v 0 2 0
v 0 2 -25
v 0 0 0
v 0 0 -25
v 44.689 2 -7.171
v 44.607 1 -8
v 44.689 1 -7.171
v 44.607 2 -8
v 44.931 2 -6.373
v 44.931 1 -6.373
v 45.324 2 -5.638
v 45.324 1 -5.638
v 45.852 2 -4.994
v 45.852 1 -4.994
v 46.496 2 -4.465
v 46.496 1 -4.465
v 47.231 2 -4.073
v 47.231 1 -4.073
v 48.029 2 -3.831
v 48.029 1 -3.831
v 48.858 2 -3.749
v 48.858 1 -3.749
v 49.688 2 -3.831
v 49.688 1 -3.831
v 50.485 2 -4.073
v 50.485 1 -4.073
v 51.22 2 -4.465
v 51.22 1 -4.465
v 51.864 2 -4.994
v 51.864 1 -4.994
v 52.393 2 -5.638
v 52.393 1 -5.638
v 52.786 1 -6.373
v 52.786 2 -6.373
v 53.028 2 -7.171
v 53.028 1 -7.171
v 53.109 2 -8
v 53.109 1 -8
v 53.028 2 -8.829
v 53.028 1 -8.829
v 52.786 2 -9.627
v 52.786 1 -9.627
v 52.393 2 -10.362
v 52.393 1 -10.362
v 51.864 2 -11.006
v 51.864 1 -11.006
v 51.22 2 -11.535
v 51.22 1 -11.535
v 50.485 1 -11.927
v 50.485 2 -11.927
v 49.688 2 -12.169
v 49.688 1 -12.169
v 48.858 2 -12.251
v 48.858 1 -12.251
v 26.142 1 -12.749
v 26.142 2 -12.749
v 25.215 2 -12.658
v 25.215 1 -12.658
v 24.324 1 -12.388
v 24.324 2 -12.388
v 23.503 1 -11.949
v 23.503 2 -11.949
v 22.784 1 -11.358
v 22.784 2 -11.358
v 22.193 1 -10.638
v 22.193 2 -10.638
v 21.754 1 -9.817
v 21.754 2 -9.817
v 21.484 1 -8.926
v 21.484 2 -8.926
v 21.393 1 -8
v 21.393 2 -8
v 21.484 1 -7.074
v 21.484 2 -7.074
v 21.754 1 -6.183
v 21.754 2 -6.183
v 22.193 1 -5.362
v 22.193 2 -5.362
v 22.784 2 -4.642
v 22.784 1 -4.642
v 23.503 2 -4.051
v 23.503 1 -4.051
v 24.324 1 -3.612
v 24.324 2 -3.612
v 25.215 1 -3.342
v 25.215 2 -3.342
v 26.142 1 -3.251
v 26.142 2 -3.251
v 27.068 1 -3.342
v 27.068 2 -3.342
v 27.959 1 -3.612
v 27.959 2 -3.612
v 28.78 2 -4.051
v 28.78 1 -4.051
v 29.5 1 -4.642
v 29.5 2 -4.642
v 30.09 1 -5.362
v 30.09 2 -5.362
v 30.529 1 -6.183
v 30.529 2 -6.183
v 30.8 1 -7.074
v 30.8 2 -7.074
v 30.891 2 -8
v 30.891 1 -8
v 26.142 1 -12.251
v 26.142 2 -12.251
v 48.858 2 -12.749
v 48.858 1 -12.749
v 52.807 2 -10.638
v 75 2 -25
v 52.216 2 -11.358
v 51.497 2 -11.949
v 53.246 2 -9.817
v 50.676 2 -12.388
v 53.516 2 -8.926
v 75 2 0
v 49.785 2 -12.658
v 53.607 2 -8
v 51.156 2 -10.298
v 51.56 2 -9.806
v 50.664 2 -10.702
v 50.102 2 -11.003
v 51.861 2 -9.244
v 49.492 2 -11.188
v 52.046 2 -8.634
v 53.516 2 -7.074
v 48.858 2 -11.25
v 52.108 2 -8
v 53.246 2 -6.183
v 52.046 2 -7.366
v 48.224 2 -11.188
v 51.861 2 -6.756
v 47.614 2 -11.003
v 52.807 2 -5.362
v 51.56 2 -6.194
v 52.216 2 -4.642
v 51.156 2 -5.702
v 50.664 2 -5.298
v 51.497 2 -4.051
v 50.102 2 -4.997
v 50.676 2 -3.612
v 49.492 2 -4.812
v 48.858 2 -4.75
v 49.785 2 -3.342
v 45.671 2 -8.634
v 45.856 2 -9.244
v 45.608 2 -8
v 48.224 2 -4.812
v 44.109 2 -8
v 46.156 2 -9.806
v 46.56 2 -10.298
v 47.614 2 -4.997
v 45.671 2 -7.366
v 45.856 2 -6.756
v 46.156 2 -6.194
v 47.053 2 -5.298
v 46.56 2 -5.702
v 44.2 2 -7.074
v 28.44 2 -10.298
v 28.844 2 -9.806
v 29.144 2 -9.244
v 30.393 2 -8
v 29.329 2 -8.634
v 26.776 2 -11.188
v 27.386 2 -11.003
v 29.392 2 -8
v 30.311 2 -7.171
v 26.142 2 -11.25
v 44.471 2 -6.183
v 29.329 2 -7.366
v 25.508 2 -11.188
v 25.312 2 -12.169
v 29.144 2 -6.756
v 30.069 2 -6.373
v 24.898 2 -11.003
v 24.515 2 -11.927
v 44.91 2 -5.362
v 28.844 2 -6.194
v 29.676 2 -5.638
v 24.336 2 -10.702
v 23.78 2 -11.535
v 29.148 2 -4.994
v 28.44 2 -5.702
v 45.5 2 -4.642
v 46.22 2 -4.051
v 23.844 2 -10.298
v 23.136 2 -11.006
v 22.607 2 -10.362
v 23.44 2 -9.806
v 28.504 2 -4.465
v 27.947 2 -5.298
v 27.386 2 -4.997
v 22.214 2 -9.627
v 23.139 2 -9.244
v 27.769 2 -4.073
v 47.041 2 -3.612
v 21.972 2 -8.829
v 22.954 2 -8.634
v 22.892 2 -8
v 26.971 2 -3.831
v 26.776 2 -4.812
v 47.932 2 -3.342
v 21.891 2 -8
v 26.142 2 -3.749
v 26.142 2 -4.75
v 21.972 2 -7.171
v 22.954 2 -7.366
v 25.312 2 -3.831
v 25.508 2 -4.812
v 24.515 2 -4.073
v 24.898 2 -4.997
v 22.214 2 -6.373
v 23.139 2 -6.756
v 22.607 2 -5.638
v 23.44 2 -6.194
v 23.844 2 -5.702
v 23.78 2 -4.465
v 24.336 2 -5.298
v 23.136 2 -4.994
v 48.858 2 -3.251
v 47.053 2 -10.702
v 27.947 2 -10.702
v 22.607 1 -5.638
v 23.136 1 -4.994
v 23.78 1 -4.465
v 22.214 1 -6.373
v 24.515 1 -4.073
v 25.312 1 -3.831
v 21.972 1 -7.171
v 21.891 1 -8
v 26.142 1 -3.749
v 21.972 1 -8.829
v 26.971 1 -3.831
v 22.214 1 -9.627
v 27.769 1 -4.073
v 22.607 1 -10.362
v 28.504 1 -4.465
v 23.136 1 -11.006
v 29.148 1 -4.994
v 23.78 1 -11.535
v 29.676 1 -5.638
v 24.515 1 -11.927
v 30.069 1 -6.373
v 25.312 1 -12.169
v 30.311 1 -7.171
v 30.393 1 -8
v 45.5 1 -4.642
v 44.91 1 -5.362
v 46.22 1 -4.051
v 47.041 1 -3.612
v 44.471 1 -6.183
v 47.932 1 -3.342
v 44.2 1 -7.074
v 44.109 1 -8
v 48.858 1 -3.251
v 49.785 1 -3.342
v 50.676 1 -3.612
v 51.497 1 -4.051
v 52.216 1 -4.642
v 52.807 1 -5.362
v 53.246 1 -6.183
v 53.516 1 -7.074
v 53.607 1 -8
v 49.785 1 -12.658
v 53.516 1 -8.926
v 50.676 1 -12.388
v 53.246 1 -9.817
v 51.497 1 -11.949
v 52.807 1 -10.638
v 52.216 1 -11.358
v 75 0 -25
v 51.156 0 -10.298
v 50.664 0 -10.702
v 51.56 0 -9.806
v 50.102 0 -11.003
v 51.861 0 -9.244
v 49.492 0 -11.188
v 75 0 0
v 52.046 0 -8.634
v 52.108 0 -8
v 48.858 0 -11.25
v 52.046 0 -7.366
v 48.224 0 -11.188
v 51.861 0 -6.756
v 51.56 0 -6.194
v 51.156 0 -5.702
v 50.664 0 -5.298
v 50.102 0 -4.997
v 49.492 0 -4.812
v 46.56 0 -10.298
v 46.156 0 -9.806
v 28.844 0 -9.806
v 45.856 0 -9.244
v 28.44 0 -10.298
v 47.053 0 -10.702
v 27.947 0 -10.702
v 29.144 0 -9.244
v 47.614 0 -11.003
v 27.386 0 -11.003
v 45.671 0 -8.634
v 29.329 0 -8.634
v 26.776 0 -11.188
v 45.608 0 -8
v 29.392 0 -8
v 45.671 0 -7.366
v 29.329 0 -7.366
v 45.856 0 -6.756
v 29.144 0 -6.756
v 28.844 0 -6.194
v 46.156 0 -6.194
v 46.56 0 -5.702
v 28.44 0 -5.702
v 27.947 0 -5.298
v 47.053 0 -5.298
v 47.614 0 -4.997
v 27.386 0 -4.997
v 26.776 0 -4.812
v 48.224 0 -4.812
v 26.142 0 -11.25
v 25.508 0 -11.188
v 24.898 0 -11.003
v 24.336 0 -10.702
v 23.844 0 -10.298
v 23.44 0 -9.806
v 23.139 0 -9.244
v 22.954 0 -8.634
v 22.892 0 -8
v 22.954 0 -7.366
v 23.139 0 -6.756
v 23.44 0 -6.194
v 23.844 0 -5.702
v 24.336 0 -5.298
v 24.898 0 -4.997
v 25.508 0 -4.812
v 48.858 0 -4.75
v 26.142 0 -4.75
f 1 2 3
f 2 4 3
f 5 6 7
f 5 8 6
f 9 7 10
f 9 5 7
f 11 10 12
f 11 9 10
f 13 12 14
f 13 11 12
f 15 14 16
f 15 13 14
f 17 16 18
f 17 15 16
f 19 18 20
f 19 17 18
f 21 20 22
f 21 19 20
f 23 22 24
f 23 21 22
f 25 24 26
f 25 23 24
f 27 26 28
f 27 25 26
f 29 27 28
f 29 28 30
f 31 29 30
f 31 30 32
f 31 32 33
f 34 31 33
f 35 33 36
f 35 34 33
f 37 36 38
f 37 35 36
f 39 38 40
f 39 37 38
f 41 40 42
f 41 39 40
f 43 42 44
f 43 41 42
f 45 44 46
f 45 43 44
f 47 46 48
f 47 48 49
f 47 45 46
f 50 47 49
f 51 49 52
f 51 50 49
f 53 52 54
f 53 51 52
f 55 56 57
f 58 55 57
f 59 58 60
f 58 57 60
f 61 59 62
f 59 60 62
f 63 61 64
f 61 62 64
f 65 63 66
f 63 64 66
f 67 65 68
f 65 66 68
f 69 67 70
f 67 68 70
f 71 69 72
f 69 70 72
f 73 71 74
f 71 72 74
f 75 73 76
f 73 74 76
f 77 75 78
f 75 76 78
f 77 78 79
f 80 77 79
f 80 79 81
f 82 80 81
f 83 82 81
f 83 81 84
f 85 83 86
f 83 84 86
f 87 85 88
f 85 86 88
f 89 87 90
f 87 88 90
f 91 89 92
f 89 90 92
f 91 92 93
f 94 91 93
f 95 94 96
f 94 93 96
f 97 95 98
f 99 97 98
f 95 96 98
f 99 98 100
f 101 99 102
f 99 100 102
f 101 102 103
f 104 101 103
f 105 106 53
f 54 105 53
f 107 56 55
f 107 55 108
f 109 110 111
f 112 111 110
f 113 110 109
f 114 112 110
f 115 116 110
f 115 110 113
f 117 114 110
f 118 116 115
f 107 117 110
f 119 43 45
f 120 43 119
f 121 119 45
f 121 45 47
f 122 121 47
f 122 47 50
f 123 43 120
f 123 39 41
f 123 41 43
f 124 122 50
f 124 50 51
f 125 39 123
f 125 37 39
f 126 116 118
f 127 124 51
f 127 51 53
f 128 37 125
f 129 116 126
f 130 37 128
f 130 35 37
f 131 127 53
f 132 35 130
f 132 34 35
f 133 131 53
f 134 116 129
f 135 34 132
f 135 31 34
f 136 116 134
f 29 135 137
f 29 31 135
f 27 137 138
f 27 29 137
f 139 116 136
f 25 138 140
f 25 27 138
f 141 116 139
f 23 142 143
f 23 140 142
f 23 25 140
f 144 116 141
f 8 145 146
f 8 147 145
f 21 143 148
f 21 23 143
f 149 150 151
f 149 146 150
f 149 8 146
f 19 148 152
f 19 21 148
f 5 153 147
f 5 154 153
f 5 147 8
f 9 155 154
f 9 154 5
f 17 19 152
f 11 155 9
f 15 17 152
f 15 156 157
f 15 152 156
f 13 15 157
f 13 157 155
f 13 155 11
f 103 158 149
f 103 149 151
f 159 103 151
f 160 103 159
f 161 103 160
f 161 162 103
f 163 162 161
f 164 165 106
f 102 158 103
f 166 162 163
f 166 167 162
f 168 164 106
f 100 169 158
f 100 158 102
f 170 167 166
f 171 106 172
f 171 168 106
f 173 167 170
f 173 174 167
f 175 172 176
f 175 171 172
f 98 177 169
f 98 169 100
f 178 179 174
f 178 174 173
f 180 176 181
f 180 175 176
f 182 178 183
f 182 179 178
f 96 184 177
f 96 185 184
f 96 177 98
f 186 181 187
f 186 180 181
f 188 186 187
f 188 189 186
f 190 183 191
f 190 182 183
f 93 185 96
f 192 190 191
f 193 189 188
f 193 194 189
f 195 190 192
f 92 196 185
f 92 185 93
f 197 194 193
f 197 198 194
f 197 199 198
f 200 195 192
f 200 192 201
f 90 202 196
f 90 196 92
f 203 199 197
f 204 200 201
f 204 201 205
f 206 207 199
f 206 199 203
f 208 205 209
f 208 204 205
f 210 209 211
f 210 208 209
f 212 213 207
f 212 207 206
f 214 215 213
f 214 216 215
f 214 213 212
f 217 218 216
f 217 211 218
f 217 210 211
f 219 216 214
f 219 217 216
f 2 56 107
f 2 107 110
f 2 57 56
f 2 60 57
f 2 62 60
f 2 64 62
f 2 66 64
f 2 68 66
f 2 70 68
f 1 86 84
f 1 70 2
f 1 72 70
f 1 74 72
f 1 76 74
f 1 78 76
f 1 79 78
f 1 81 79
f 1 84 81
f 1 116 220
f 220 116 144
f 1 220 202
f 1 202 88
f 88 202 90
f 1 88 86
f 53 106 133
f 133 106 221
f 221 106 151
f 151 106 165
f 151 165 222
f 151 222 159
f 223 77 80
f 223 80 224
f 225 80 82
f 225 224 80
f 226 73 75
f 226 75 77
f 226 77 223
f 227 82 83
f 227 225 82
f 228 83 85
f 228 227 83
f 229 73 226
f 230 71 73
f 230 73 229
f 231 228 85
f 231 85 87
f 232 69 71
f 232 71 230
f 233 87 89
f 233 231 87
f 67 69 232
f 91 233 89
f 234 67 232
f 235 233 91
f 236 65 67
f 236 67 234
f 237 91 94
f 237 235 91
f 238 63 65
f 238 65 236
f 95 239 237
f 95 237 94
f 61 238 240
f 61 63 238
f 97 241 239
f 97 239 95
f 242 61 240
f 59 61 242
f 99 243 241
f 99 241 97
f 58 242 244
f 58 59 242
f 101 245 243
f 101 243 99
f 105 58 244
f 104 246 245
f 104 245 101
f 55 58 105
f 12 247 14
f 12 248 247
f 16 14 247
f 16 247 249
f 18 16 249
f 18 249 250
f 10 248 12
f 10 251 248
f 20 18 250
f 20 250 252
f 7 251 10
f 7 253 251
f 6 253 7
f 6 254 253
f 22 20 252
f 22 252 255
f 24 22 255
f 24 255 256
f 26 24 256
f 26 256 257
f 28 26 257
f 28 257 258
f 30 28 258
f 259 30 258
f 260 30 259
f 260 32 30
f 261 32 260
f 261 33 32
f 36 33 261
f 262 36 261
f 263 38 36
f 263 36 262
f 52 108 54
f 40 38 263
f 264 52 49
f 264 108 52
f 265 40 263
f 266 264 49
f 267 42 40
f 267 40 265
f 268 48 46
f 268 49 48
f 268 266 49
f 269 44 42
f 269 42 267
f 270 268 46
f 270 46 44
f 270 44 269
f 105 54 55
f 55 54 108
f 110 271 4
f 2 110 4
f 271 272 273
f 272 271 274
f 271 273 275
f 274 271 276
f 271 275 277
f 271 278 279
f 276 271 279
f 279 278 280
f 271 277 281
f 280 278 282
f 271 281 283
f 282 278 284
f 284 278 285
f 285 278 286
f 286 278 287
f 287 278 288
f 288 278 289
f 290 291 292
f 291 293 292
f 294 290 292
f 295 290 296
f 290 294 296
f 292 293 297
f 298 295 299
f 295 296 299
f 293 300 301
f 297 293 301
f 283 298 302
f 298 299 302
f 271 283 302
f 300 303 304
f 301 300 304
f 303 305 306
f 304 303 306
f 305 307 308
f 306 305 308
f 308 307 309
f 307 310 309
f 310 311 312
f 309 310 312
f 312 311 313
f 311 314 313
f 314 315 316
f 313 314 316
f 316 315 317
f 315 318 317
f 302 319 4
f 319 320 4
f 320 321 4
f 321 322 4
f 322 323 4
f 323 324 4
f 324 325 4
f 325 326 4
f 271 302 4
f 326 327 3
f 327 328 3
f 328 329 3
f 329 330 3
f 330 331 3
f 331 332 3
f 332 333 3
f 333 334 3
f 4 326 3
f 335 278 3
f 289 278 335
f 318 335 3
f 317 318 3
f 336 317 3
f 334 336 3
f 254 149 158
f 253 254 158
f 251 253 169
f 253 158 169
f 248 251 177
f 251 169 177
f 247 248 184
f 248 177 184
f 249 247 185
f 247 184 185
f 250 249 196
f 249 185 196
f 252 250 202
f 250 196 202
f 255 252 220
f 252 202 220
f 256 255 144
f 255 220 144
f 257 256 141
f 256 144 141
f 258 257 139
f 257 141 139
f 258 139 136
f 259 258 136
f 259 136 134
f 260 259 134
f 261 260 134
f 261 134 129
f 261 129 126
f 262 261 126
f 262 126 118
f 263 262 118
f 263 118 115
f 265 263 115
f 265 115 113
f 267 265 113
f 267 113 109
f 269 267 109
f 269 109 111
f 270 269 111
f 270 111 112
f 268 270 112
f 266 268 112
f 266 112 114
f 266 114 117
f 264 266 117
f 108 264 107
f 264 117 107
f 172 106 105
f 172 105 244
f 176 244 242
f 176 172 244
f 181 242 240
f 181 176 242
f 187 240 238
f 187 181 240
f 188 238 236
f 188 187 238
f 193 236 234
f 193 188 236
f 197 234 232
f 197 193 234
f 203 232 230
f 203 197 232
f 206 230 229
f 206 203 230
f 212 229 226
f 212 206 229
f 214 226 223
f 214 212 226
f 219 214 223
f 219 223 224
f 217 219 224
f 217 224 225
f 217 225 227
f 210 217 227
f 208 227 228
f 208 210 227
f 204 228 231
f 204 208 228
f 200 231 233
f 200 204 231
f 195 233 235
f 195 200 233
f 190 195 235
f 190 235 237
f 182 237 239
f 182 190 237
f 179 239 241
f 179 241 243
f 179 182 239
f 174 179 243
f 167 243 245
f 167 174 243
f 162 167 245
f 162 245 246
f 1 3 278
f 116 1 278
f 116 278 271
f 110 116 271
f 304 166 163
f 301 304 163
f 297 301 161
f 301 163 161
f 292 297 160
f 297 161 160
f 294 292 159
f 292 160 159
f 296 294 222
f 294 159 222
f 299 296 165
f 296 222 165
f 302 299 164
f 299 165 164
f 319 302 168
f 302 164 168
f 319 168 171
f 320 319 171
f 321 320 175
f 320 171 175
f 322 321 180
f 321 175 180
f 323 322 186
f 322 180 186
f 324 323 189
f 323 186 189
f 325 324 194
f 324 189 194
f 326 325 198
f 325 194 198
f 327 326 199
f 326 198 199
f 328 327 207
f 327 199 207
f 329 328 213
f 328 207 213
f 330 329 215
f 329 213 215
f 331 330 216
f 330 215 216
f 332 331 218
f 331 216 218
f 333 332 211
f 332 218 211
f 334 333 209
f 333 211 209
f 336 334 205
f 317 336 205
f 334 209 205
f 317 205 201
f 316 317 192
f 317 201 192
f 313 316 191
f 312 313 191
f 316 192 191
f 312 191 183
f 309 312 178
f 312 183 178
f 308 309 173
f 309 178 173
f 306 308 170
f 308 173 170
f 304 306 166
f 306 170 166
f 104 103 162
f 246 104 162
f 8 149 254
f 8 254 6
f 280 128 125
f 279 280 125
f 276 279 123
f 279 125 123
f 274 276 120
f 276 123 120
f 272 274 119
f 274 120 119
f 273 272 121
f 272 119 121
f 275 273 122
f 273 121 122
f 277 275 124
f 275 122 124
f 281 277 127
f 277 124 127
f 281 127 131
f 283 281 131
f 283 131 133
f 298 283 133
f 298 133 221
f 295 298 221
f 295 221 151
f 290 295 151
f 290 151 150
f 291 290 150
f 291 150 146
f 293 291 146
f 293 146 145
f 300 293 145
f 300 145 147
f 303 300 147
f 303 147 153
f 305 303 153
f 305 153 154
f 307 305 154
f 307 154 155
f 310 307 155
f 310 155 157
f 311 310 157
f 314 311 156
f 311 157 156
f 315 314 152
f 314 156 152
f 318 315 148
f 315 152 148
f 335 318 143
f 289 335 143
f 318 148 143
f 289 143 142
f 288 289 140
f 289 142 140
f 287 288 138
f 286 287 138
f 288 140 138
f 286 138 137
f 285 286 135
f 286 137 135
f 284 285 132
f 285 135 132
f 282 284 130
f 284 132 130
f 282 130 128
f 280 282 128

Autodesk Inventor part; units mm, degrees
ref_plane "YZ Plane" through (0, 0, 0) normal (1, 0, 0) x (0, 1, 0)
ref_plane "XZ Plane" through (0, 0, 0) normal (0, 1, 0) x (-1, 0, 0)
ref_plane "XY Plane" through (0, 0, 0) normal (0, 0, 1) x (1, 0, 0)
sketch "Sombreado_1" plane through (0, 0, 0) normal (0, 0, 1) x (1, 0, 0)
  point P0 (0, 0)
sketch "Sombreado_2" plane through (0, 0, 0) normal (0, 0, 1) x (1, 0, 0)
  point P0 (0, 0)
sketch "Sombreado_3" plane through (0, 0, 0) normal (0, 0, 1) x (1, 0, 0)
  point P0 (0, 0)
sketch "Boceto1" plane through (0, 0, 0) normal (0, 1, 0) x (-1, 0, 0)
  line L0 (30.3882, 1.25) -> (30.8882, 1.25)
  line L1 (0, -6.75) -> (75, -6.75)
  line L2 (75, -6.75) -> (75, 18.25)
  line L3 (75, 18.25) -> (0, 18.25)
  line L4 (0, 18.25) -> (0, -6.75)
  arc A0 (21.3882, 1.25) -> (30.8882, 1.25) centre (26.1382, 1.25) ccw
  arc A1 (21.8882, 1.25) -> (30.3882, 1.25) centre (26.1382, 1.25) ccw
  line L5 (21.3882, 1.25) -> (21.8882, 1.25)
  line L6 (1.8, 2.5) -> (5.3, 2.5)
  line L7 (1.8, 2.5) -> (1.8, 3)
  line L8 (1.8, 3) -> (1, 3)
  line L9 (1, 3) -> (1, 2.5)
  line L10 (1, 0) -> (0, 0)
  line L11 (1, 0) -> (1, -0.5)
  line L12 (1, -0.5) -> (1.8, -0.5)
  line L13 (1.8, -0.5) -> (1.8, 0)
  line L14 (5.3, 0) -> (1.8, 0)
  line L15 (0, 2.5) -> (1, 2.5)
  line L16 (1.8, 11.5) -> (5.3, 11.5)
  line L17 (5.3, 9) -> (1.8, 9)
  line L18 (1, 9) -> (0, 9)
  line L19 (0, 11.5) -> (1, 11.5)
  line L20 (1.8, 11.5) -> (1.8, 12)
  line L21 (1.8, 12) -> (1, 12)
  line L22 (1, 12) -> (1, 11.5)
  line L23 (1, 9) -> (1, 8.5)
  line L24 (1, 8.5) -> (1.8, 8.5)
  line L25 (1.8, 8.5) -> (1.8, 9)
  line L26 (44.6082, 1.25) -> (44.1082, 1.25)
  arc A2 (44.1082, 1.25) -> (53.6082, 1.25) centre (48.8582, 1.25) ccw
  arc A3 (44.6082, 1.25) -> (53.1082, 1.25) centre (48.8582, 1.25) ccw
  line L27 (53.6082, 1.25) -> (53.1082, 1.25)
  line L28 (73.1964, 2.5) -> (69.6964, 2.5)
  line L29 (69.6964, 0) -> (73.1964, 0)
  line L30 (73.9964, 0) -> (74.9964, 0)
  line L31 (74.9964, 2.5) -> (73.9964, 2.5)
  line L32 (73.1964, 2.5) -> (73.1964, 3)
  line L33 (73.1964, 3) -> (73.9964, 3)
  line L34 (73.9964, 3) -> (73.9964, 2.5)
  line L35 (73.9964, 0) -> (73.9964, -0.5)
  line L36 (73.9964, -0.5) -> (73.1964, -0.5)
  line L37 (73.1964, -0.5) -> (73.1964, 0)
  line L38 (73.1964, 11.5) -> (69.6964, 11.5)
  line L39 (69.6964, 9) -> (73.1964, 9)
  line L40 (73.9964, 9) -> (74.9964, 9)
  line L41 (74.9964, 11.5) -> (73.9964, 11.5)
  line L42 (73.1964, 11.5) -> (73.1964, 12)
  line L43 (73.1964, 12) -> (73.9964, 12)
  line L44 (73.9964, 12) -> (73.9964, 11.5)
  line L45 (73.9964, 9) -> (73.9964, 8.5)
  line L46 (73.9964, 8.5) -> (73.1964, 8.5)
  line L47 (73.1964, 8.5) -> (73.1964, 9)
  line L48 (75, 18.25) -> (75, 43.25)
  line L49 (75, 43.25) -> (0, 43.25)
  line L50 (0, 43.25) -> (0, 18.25)
  line L51 (5.3, 11.5) -> (5.3, 9)
  line L52 (5.3, 2.5) -> (5.3, 0)
  line L53 (69.6964, 11.5) -> (69.6964, 9)
  line L54 (69.6964, 2.5) -> (69.6964, 0)
  circle A4 centre (26.1382, 1.25) radius 3.25
  circle A5 centre (48.8582, 1.25) radius 3.25
  circle A6 centre (26.1382, 26.25) radius 3.25
  circle A7 centre (48.8582, 26.25) radius 3.25
  line L55 (75, 43.25) -> (75, 68.25)
  line L56 (75, 68.25) -> (0, 68.25)
  line L57 (0, 68.25) -> (0, 43.25)
  circle A8 centre (26.1382, 51.25) radius 3.25
  circle A9 centre (48.8582, 51.25) radius 3.25
  point P0 (0, 0)
sketch "Boceto3" plane through (0, 0, 0) normal (0, 1, 0) x (-1, 0, 0)
  line L0 (0, 0) -> (-75, 0)
  line L1 (-75, 0) -> (-75, -25)
  line L2 (-75, -25) -> (0, -25)
  line L3 (0, -25) -> (0, 0)
  line L4 (0, 0) -> (-75, 0)
  line L5 (-75, 0) -> (-75, -25)
  line L6 (-75, -25) -> (0, -25)
  line L7 (0, -25) -> (0, 0)
  dimension "d4" = 75
  dimension "d5" = 25
  dimension "d6" = 75
  dimension "d7" = 25
extrude "Extrusión1" add sketch "Boceto3" along normal blind 2
sketch "Boceto4" plane through (0, 2, 0) normal (0, 1, 0) x (1, 0, 0)
  circle A0 centre (26.1418, 8) radius 3.25
  line L0 (0, 0) -> (75, 0) projected
  line L1 (75, 25) -> (0, 25) projected
  circle A1 centre (48.8582, 8) radius 3.25
extrude "Extrusión2" cut sketch "Boceto4" against normal blind 2
sketch "Boceto5" plane through (0, 2, 0) normal (0, 1, 0) x (1, 0, 0)
  line L0 (30.8908, 8) -> (30.3928, 8)
  line L1 (44.1092, 8) -> (44.6072, 8)
  arc A0 (44.6072, 8) -> (48.8582, 12.251) centre (48.8582, 8) ccw
  arc A1 (44.1092, 8) -> (48.8582, 12.749) centre (48.8582, 8) ccw
  arc A2 (26.1418, 12.251) -> (30.3928, 8) centre (26.1418, 8) ccw
  arc A3 (26.1418, 12.749) -> (30.8908, 8) centre (26.1418, 8) ccw
  line L2 (26.1418, 12.251) -> (48.8582, 12.251)
  line L3 (26.1418, 12.749) -> (48.8582, 12.749)
  point P0 (0, 0)
extrude "Extrusión3" cut sketch "Boceto5" against normal blind 1
properties part number "2ureactor TorusTapa1" material "PPS Plastic"
